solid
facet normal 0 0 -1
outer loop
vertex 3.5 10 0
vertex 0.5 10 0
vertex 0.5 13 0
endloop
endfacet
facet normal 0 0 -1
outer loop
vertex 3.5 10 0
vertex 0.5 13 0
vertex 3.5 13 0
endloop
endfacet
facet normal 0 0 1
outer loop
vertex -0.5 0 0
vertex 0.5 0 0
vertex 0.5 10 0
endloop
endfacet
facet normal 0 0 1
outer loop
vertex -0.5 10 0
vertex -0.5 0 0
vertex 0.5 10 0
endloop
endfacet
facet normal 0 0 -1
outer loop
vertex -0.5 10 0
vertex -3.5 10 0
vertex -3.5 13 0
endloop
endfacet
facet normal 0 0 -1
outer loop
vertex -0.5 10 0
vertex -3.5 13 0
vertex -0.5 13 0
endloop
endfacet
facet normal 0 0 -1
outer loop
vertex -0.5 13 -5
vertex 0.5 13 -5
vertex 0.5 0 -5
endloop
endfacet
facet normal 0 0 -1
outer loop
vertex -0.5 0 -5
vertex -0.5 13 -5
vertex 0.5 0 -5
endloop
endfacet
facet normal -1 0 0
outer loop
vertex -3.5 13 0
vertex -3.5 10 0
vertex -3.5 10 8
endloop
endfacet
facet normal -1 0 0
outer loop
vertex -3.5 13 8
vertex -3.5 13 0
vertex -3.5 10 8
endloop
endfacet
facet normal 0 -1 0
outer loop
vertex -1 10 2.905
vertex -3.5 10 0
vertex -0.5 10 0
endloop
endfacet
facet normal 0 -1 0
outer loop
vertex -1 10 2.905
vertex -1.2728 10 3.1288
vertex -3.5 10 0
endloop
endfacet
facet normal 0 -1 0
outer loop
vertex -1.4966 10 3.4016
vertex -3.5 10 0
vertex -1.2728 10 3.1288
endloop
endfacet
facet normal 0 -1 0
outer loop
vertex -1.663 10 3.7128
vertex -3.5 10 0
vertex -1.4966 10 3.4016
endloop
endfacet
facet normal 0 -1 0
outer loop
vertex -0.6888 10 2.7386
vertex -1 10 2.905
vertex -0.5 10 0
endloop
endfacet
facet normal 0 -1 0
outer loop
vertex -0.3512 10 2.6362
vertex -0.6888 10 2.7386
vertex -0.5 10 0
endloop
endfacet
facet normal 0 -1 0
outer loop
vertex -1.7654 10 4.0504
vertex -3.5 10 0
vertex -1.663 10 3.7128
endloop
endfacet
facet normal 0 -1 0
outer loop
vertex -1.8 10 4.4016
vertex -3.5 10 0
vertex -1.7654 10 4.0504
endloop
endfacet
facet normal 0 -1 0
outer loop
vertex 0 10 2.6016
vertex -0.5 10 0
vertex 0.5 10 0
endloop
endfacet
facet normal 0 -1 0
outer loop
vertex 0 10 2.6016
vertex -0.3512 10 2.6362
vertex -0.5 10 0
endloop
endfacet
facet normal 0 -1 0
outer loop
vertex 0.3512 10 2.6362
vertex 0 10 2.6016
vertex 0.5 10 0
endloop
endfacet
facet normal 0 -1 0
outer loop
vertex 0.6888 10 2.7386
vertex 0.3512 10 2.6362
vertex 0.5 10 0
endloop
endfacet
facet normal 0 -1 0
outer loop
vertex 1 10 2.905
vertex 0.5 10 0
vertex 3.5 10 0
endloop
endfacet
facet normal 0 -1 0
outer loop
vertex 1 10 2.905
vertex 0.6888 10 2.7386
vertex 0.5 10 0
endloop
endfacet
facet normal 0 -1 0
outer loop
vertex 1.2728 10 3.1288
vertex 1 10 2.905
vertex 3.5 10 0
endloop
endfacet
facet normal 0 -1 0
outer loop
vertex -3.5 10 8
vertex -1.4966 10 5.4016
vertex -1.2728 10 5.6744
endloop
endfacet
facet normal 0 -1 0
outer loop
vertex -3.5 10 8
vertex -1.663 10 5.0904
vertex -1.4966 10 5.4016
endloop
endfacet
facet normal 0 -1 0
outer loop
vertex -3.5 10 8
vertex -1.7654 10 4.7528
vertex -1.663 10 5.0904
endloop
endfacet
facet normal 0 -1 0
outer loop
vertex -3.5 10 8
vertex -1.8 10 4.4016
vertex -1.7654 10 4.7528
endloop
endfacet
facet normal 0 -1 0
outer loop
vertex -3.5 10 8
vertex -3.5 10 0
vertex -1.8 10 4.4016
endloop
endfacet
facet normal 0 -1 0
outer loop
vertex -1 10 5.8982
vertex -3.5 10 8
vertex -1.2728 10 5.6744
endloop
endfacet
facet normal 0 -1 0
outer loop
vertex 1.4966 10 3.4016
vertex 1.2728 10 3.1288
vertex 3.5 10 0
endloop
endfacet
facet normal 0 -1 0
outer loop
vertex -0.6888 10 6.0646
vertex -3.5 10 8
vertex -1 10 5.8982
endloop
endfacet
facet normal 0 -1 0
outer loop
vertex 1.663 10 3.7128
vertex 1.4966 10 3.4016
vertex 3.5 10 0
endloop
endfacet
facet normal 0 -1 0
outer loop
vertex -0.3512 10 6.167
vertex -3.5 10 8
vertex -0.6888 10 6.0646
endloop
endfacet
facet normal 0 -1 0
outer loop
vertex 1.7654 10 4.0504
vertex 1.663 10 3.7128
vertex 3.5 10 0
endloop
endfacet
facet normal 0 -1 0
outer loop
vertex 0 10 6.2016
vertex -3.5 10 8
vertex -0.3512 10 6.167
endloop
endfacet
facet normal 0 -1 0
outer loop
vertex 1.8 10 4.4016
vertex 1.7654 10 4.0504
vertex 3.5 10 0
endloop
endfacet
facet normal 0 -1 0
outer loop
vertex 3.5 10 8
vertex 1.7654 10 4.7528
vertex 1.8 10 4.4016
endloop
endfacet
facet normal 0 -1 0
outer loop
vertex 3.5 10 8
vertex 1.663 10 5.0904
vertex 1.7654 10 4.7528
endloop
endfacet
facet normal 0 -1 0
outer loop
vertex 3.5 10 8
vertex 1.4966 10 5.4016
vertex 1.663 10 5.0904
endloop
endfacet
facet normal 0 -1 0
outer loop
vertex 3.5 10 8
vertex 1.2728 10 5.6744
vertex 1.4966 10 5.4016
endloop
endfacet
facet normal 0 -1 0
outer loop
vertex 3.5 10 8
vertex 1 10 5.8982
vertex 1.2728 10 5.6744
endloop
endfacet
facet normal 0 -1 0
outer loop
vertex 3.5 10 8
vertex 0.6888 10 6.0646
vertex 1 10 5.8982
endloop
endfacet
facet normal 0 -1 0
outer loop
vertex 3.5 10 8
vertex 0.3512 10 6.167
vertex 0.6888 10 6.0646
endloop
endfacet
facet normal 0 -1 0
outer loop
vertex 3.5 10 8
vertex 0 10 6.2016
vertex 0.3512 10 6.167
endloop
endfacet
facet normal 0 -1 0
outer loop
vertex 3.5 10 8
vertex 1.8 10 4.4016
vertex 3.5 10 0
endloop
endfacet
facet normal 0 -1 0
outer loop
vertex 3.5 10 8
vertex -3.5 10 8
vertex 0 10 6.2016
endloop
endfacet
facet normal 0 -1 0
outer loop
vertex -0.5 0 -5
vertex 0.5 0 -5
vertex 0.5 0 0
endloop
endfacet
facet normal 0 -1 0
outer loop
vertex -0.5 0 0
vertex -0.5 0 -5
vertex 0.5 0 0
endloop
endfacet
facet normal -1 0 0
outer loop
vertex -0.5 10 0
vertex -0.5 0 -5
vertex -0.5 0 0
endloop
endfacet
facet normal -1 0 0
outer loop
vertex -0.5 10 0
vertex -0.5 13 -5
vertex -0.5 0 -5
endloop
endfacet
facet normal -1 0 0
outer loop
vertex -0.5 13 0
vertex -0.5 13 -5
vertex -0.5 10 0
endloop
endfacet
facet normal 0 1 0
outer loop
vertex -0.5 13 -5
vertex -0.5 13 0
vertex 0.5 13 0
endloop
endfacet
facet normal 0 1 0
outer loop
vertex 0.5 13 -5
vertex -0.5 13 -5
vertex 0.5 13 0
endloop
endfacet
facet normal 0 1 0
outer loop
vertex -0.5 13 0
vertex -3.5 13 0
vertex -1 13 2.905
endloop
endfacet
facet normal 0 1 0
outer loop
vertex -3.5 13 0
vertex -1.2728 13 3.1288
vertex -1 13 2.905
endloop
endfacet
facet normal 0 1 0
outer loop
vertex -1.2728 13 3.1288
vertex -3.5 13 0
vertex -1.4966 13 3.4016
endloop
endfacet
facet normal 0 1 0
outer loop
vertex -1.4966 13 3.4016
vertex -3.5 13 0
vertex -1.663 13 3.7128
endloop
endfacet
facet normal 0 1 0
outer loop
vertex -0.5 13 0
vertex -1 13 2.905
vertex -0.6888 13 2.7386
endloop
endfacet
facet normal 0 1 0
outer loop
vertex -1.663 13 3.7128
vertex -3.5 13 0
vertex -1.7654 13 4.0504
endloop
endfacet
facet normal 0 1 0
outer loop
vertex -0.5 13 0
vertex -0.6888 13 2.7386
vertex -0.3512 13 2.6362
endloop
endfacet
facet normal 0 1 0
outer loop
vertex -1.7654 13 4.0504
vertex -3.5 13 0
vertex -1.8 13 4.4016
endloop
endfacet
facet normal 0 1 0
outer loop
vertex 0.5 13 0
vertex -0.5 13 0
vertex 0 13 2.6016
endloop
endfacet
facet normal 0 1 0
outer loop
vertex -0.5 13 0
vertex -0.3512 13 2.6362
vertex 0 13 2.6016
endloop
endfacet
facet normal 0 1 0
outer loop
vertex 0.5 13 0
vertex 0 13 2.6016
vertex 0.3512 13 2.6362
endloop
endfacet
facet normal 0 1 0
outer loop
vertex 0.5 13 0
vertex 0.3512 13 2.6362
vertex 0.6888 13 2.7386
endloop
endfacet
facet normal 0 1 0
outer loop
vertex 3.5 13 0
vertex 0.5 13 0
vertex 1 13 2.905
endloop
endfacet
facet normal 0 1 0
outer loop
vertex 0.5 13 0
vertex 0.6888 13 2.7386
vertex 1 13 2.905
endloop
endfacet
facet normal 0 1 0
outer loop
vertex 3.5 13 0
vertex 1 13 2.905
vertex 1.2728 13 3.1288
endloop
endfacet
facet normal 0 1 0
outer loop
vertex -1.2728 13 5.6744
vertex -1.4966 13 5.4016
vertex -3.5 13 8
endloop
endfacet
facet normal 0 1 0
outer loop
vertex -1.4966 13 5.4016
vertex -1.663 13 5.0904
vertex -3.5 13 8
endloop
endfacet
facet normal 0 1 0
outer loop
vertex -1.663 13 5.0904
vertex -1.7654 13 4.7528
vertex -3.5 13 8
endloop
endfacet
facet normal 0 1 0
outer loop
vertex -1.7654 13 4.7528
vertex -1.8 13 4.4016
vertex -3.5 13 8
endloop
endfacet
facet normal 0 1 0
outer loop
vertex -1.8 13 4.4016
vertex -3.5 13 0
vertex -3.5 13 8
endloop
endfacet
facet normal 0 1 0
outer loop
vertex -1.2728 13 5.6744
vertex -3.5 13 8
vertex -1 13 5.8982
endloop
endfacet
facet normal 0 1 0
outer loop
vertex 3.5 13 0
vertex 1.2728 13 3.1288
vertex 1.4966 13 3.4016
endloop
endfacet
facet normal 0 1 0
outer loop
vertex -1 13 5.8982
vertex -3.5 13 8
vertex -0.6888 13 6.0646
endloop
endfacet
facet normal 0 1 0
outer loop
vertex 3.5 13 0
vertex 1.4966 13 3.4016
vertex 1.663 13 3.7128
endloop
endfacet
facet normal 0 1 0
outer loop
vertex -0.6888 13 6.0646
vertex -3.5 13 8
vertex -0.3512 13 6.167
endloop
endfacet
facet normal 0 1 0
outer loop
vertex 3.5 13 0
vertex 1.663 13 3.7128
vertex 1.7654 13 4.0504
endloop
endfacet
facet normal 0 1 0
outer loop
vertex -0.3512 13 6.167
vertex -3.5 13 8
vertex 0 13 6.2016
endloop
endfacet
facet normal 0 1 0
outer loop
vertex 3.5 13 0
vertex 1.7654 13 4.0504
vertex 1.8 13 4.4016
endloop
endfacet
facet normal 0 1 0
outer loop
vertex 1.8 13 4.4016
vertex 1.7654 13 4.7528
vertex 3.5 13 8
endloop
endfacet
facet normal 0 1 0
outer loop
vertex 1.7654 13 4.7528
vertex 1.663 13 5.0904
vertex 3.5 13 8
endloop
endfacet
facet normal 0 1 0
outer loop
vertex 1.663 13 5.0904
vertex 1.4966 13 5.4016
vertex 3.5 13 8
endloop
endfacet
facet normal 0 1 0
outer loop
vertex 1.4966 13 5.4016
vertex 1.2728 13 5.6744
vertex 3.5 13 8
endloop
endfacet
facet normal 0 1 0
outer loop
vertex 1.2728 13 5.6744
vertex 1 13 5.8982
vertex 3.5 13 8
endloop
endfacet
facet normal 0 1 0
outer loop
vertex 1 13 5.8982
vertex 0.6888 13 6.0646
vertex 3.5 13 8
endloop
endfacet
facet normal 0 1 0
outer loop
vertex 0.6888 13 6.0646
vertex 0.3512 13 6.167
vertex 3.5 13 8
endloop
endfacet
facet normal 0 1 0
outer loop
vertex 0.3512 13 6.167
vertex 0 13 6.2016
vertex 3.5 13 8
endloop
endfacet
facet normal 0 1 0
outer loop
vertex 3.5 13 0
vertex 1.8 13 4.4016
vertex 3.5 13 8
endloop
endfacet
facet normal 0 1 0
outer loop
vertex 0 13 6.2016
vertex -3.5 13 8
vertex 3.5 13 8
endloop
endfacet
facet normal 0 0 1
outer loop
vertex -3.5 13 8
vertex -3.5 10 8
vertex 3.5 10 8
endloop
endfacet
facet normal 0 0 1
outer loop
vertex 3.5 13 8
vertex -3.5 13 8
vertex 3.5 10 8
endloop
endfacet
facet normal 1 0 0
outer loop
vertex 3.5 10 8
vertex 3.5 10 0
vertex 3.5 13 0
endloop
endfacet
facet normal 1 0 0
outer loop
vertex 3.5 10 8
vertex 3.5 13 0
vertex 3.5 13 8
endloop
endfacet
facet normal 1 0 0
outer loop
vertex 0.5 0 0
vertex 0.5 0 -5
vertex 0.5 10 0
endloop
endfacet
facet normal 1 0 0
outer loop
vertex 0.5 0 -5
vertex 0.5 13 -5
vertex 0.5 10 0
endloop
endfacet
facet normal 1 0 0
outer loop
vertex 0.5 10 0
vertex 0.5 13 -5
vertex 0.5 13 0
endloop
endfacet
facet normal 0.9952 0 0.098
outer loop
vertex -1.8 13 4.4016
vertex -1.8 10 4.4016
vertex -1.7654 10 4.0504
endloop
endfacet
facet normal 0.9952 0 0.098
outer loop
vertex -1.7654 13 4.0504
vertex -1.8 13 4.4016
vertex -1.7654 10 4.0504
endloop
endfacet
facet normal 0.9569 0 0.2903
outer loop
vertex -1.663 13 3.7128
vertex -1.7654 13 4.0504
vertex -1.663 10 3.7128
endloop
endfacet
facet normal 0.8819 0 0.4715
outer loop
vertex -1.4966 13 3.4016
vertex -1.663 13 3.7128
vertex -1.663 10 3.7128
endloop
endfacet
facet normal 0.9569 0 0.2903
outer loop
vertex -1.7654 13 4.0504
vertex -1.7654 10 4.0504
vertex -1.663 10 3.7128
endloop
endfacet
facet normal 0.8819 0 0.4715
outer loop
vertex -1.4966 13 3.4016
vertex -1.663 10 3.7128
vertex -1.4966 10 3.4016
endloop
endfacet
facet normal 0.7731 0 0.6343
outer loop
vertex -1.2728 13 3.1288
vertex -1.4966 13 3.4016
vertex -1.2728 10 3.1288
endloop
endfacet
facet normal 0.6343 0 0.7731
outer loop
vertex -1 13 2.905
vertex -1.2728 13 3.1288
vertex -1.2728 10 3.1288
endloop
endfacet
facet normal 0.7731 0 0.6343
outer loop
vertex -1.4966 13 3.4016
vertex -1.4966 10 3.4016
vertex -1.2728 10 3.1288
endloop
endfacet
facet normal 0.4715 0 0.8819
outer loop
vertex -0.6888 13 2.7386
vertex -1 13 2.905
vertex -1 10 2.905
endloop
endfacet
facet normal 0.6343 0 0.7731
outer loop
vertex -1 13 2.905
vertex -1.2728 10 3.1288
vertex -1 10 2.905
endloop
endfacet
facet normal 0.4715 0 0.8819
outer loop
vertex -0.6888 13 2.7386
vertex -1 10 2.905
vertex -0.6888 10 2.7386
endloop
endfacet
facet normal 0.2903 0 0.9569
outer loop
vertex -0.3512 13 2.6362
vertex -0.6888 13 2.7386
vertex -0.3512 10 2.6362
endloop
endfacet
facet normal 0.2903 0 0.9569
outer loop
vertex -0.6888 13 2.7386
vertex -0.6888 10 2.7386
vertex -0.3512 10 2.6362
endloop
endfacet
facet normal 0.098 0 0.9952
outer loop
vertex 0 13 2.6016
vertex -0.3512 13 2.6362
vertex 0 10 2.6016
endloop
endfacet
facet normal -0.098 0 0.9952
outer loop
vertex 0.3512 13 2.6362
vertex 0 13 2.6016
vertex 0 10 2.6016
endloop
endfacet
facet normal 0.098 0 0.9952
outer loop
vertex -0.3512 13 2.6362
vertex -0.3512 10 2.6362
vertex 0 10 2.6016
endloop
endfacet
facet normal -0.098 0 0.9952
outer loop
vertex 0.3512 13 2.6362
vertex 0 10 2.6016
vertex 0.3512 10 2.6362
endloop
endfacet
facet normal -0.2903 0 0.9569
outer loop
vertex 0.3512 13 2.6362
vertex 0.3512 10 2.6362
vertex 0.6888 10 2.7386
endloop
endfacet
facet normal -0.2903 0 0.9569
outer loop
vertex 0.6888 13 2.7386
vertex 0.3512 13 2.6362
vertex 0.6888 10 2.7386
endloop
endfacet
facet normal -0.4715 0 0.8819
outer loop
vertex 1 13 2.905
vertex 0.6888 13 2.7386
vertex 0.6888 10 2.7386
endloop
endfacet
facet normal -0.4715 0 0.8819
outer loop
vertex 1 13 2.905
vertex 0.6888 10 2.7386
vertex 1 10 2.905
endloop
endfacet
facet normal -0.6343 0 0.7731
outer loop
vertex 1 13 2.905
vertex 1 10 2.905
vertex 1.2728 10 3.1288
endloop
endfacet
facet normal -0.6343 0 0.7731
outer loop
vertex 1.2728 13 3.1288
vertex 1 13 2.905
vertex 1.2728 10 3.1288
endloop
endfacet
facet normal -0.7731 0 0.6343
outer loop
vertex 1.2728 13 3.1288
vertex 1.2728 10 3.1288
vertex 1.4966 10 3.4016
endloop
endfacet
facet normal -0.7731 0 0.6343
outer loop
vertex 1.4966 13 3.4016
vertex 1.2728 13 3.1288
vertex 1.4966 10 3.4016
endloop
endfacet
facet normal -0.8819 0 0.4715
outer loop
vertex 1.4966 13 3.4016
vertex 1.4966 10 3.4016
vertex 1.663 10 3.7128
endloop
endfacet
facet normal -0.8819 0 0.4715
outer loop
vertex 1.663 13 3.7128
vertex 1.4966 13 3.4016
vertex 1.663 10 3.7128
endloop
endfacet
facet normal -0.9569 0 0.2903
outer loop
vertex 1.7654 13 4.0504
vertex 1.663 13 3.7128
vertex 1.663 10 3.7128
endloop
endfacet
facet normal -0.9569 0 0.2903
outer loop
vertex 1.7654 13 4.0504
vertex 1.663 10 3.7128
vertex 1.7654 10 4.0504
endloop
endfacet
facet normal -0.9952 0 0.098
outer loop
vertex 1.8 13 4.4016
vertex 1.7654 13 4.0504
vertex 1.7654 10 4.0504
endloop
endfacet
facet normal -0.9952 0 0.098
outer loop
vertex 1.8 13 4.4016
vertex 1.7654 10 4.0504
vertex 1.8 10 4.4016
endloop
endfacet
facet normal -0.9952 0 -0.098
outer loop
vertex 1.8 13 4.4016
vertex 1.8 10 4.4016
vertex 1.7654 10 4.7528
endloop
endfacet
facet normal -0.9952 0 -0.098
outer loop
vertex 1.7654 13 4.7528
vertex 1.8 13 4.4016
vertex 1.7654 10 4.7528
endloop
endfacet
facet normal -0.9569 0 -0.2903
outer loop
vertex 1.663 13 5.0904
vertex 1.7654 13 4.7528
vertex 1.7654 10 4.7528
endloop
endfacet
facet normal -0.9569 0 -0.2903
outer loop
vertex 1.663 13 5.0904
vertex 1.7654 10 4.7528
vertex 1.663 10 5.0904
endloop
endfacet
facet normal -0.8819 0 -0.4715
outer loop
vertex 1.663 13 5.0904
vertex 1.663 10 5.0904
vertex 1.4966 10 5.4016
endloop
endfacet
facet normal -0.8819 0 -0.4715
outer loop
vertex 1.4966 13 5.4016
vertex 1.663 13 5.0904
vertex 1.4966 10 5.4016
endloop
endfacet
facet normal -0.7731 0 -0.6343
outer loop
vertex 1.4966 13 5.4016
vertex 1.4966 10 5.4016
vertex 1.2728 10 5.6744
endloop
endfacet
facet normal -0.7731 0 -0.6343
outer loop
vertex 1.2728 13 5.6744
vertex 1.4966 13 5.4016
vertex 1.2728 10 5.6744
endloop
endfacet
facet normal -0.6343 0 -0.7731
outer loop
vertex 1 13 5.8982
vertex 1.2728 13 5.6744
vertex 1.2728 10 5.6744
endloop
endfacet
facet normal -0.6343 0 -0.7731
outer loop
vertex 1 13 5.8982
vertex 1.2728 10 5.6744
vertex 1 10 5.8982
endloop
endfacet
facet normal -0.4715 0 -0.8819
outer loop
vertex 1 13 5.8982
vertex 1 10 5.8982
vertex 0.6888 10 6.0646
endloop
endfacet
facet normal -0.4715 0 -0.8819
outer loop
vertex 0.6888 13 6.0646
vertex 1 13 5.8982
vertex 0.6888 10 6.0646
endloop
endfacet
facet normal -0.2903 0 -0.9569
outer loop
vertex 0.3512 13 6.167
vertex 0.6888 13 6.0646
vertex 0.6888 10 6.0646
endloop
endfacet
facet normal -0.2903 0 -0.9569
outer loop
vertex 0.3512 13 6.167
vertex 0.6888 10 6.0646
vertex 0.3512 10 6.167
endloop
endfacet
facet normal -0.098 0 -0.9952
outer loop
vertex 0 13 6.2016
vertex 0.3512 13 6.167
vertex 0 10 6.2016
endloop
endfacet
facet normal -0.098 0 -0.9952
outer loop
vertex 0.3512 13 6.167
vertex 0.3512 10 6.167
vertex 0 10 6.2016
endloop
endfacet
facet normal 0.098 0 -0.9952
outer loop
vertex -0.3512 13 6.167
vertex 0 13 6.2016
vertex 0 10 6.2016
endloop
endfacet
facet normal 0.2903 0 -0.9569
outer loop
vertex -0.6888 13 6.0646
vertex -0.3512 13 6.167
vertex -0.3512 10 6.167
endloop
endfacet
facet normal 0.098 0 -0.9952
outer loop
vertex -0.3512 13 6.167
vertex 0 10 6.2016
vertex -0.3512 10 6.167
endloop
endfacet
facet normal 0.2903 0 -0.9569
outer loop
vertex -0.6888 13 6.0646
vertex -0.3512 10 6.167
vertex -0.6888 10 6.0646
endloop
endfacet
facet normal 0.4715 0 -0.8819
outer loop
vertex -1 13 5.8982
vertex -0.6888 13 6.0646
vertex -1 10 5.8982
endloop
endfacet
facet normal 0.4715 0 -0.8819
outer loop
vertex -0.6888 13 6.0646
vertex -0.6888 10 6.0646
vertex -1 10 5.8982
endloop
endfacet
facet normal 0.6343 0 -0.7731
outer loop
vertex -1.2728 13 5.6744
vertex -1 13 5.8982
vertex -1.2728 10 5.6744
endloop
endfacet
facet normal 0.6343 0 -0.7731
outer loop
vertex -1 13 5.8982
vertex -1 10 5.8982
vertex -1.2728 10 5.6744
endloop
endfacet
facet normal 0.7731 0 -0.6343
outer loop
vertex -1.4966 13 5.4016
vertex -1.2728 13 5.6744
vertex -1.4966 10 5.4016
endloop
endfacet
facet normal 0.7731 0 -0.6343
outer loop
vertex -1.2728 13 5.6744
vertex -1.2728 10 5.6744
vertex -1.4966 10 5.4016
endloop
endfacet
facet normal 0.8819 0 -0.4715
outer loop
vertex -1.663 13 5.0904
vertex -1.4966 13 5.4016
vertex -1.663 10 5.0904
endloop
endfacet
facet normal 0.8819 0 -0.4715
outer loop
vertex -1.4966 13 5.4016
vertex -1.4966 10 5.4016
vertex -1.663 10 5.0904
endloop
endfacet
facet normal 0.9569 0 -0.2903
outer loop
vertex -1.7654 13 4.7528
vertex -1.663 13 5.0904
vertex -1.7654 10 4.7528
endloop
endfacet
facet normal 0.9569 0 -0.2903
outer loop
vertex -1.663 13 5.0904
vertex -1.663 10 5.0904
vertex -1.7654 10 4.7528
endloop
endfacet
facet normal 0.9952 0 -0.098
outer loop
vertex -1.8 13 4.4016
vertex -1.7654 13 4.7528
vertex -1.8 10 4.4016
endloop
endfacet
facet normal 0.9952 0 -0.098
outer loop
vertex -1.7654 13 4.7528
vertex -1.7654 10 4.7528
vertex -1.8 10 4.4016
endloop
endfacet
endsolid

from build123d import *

# Parameters (mm, degrees)
BOSS_EXTRUDE1_DEPTH  = 0.5
SKETCH2_W            = 7
SKETCH2_H            = 8
BOSS_EXTRUDE2_DEPTH  = 3
M3_CLEARANCE_HOLE1_D = 3.6


with BuildPart() as part:
    # Sketch1 → Boss-Extrude1 (new body, symmetric)
    with BuildSketch(Plane(origin=(0, 0, 0), x_dir=(0, 0, -1), z_dir=(1, 0, 0))):
        Polygon((0, 0), (0, 10), (-8, 10), (-8, 13), (5, 13), (5, 0), align=None)
    extrude(amount=BOSS_EXTRUDE1_DEPTH, both=True)

    # Sketch2 → Boss-Extrude2 (add, through all)
    with BuildSketch(Plane.XZ.offset(-10)):
        with Locations((0, 4)):
            Rectangle(SKETCH2_W, SKETCH2_H)
    extrude(amount=-BOSS_EXTRUDE2_DEPTH)

    # M3 Clearance Hole1 (through all)
    with Locations(Plane(origin=(0, 13, 0), x_dir=(1, 0, 0), z_dir=(0, 1, 0))):
        with Locations((0, -4.401597527)):
            Hole(M3_CLEARANCE_HOLE1_D / 2)


solid = part.part
